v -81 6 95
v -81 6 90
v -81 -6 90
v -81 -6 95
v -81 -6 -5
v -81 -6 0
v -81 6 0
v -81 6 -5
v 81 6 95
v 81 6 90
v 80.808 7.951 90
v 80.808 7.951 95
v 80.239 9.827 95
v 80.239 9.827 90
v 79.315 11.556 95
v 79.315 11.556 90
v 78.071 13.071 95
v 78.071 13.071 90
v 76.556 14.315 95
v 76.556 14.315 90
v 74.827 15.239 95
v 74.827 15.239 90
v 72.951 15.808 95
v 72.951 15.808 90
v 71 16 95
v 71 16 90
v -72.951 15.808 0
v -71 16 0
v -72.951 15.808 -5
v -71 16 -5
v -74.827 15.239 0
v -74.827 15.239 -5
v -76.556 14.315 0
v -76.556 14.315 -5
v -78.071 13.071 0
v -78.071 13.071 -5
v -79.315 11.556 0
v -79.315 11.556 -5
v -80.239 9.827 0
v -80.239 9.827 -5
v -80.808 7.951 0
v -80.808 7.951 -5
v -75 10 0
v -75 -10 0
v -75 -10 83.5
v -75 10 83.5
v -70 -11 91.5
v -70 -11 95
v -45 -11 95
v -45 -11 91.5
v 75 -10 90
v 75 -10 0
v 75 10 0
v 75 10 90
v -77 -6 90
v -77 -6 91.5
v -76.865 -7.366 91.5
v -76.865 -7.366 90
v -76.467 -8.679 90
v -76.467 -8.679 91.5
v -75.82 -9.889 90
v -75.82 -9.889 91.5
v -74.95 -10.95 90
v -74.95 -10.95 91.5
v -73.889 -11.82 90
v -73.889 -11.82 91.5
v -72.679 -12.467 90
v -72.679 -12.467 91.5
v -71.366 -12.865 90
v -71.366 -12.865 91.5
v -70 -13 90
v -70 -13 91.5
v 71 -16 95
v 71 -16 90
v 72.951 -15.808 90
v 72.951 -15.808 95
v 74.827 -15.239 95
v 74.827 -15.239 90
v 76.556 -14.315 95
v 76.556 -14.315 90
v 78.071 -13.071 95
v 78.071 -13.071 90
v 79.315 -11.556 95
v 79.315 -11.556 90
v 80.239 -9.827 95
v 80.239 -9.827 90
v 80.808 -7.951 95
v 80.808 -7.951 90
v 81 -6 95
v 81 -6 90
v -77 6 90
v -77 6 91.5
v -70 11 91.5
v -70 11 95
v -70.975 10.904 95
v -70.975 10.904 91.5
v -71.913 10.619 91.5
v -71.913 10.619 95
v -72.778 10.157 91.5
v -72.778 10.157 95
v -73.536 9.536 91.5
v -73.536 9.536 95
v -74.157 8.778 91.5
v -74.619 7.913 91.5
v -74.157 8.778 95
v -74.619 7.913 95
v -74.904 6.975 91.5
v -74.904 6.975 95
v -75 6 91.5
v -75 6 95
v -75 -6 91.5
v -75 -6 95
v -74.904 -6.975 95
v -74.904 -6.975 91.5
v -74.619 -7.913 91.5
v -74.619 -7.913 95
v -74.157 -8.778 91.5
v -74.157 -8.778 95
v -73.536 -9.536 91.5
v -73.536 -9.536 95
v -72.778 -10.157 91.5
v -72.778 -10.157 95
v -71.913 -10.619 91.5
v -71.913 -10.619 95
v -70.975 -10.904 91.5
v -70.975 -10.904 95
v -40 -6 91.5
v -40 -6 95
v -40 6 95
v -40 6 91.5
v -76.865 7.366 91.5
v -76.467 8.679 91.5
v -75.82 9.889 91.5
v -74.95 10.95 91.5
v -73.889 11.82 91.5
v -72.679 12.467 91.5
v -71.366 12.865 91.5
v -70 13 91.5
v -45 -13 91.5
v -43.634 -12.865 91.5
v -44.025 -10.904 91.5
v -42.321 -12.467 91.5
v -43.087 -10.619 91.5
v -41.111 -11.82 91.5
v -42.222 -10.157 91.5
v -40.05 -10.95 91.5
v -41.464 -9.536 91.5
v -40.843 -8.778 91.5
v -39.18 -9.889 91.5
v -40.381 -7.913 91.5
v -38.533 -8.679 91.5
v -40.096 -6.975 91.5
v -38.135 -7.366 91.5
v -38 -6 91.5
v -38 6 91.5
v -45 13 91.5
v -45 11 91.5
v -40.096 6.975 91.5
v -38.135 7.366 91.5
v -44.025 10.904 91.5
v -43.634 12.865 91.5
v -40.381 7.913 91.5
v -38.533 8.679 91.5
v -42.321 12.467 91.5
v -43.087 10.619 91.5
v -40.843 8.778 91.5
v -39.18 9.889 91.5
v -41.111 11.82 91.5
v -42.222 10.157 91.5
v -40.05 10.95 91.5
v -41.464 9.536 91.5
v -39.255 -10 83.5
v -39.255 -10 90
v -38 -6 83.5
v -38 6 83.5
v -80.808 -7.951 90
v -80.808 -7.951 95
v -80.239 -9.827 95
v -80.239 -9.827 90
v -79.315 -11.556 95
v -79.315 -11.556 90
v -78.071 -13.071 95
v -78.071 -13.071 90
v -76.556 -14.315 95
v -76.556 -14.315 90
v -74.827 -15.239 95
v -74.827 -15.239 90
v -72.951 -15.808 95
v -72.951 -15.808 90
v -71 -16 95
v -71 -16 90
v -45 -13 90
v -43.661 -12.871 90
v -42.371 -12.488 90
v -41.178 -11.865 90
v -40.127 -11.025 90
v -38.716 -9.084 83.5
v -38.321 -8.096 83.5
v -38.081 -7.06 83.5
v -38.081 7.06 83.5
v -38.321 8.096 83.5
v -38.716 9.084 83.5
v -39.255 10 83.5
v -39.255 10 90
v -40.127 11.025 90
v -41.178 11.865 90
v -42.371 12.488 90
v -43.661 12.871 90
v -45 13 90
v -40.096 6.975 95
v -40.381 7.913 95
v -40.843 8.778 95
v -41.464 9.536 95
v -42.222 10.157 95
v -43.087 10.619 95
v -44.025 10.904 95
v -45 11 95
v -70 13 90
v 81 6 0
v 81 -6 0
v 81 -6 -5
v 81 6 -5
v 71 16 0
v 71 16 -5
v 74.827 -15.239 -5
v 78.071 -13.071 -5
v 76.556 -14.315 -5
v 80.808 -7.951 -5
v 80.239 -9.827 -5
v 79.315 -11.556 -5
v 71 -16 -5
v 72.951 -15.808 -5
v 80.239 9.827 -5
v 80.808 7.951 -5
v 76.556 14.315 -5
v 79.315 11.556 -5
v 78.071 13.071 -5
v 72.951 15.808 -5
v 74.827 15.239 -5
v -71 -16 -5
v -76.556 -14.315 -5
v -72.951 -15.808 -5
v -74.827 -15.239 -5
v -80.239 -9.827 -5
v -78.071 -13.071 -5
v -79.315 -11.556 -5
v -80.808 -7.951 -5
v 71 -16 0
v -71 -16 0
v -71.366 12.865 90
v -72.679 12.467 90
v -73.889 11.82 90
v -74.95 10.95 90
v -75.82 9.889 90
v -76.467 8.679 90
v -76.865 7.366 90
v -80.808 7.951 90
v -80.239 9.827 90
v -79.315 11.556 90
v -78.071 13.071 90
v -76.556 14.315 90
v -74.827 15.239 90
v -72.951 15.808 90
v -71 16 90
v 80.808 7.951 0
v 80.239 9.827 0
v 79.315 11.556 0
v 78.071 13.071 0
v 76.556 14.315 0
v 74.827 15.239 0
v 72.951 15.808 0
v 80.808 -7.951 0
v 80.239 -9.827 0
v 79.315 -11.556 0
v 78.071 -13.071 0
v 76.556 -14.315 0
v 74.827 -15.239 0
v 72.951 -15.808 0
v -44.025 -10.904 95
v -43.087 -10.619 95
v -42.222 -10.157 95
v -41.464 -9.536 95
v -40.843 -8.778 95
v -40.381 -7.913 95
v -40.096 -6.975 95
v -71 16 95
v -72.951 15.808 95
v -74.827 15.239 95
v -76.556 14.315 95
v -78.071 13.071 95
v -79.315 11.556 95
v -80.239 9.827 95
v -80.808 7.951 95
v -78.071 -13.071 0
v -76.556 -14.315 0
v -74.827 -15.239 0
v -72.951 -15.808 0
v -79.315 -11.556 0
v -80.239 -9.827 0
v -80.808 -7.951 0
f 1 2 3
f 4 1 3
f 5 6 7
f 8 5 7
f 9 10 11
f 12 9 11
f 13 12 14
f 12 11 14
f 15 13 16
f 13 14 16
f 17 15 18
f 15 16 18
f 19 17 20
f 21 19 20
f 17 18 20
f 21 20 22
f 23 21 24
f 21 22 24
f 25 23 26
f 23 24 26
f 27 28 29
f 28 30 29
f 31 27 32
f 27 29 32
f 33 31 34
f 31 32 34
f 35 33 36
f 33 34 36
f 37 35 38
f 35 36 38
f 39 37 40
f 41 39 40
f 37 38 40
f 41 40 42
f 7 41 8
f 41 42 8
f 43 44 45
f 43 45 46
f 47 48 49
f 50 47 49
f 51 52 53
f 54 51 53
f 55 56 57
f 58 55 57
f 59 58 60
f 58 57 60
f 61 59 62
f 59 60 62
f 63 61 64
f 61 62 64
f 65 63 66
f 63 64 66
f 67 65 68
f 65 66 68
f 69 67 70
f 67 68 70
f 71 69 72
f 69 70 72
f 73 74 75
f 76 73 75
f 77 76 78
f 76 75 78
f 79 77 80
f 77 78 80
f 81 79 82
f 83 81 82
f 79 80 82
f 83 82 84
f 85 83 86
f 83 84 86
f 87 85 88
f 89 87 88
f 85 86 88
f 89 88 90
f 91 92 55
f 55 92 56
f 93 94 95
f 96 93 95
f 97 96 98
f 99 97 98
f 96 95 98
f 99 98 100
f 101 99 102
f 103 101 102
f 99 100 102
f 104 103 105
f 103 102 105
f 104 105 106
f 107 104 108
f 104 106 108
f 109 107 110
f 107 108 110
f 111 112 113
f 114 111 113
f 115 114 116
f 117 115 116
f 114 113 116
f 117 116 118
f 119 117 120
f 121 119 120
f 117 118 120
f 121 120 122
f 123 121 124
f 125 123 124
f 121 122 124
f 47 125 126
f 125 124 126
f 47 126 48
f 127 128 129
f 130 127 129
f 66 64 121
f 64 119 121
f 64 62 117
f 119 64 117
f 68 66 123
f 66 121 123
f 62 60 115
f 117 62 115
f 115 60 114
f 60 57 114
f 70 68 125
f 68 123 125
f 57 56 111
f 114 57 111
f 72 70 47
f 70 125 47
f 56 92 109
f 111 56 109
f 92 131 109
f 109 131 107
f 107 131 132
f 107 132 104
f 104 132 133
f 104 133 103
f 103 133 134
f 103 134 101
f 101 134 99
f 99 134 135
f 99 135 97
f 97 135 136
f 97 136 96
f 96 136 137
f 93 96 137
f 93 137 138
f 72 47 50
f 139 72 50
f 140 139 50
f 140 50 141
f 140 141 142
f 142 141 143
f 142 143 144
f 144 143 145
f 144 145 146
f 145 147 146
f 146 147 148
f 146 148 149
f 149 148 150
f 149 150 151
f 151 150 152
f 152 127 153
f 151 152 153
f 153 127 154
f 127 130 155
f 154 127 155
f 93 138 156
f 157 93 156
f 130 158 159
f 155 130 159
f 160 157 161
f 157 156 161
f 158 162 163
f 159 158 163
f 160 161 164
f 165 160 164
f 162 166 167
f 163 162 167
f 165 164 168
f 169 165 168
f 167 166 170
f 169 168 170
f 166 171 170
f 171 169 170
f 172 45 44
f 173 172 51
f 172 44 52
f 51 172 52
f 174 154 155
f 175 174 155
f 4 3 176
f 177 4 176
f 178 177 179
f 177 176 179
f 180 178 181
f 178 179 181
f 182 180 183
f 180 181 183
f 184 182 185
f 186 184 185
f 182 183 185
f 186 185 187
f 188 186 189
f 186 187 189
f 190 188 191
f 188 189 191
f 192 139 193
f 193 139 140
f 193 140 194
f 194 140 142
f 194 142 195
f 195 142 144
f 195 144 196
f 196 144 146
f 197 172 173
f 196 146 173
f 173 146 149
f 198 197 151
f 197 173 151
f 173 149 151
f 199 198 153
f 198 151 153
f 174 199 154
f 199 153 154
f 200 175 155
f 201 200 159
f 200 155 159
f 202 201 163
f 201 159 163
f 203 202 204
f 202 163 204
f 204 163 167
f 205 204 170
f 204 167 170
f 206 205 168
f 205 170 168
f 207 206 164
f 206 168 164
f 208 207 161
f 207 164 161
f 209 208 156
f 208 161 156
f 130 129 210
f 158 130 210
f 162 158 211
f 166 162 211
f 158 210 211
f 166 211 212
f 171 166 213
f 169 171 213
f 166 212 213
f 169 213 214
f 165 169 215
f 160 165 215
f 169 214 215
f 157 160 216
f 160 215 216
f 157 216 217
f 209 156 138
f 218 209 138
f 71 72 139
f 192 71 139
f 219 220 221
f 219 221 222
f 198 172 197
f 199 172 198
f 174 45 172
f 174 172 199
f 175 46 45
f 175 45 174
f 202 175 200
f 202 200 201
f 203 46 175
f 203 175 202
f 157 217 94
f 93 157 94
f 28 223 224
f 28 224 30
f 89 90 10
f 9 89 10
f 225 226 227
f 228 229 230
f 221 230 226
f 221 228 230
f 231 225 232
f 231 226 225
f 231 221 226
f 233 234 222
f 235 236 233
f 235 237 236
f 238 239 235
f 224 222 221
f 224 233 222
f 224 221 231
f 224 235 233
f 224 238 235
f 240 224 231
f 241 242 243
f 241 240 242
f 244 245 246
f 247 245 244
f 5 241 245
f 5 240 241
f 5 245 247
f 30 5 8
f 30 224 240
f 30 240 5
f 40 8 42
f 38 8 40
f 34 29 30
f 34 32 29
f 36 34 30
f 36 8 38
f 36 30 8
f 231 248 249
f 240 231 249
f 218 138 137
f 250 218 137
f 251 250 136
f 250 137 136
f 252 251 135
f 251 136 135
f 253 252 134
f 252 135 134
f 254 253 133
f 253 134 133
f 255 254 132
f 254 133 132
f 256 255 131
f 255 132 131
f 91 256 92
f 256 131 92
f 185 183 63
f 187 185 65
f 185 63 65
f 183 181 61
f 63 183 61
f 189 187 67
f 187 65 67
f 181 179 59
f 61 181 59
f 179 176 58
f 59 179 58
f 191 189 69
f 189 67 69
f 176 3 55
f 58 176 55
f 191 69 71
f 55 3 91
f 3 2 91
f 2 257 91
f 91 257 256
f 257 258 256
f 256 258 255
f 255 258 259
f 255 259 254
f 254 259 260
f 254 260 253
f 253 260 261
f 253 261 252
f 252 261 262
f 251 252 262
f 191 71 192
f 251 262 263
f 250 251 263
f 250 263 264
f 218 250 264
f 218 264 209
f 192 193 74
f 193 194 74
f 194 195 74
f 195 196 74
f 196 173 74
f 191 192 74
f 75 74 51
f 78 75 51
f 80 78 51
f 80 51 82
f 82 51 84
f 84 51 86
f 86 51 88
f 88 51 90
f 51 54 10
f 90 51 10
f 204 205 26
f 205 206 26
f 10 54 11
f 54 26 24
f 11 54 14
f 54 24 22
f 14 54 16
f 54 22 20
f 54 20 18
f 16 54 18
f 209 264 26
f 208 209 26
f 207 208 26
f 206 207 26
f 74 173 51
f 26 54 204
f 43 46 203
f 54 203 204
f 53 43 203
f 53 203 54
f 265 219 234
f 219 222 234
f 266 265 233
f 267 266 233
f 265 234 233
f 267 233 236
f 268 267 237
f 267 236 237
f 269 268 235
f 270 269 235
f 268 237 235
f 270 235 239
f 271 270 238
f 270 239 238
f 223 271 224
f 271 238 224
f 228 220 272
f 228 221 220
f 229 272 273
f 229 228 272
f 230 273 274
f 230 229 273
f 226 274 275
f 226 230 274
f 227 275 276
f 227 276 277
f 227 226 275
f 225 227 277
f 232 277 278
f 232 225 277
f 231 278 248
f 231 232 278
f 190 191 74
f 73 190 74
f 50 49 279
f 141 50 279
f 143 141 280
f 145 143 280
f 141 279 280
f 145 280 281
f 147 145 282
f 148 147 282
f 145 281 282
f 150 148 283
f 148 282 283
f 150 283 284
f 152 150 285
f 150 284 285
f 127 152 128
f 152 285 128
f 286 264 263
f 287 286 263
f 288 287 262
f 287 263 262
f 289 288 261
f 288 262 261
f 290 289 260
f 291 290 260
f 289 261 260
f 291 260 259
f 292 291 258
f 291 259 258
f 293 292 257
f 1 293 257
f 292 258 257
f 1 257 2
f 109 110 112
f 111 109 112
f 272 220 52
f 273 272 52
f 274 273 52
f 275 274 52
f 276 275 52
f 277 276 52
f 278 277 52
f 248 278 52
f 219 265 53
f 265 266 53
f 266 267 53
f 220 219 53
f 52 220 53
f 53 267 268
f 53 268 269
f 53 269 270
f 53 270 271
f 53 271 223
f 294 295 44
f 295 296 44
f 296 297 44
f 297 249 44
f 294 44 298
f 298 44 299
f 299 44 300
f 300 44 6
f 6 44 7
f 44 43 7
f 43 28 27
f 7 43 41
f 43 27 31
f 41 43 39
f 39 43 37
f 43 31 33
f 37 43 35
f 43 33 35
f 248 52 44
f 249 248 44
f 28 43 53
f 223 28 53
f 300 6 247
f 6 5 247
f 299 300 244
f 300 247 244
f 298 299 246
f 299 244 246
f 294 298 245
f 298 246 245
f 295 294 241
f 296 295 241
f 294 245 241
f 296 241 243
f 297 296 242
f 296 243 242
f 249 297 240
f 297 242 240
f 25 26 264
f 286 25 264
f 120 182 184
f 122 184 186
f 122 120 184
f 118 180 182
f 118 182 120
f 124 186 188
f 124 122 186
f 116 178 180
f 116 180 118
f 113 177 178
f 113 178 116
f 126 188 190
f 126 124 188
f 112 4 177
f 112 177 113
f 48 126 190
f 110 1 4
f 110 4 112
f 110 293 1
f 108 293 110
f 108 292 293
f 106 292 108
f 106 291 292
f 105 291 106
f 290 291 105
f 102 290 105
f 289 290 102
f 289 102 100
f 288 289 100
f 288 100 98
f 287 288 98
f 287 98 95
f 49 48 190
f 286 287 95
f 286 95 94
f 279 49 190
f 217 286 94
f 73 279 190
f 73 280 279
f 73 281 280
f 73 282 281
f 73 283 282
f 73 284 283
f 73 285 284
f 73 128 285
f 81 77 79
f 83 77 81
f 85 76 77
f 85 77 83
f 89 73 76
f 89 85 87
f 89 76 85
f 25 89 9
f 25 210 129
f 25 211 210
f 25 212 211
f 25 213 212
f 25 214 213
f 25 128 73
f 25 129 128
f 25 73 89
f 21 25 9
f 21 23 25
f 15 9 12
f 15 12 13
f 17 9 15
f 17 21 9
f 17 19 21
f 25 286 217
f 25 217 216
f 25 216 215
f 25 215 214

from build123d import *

# Parameters (mm, degrees)
SKETCH1_W           = 150
SKETCH1_H           = 20
BOSS_EXTRUDE1_DEPTH = 90
SKETCH2_W           = 162
SKETCH2_H           = 32
BOSS_EXTRUDE2_DEPTH = 5
FILLET1_R           = 10
FILLET2_R           = 10
FILLET3_R           = 10
FILLET4_R           = 10
BOSS_EXTRUDE3_DEPTH = 5
CUT_EXTRUDE1_DEPTH  = 3.5
CUT_EXTRUDE2_DEPTH  = 8


with BuildPart() as part:
    # Sketch1 → Boss-Extrude1 (new body)
    with BuildSketch(Plane.XY):
        Rectangle(SKETCH1_W, SKETCH1_H)
    extrude(amount=BOSS_EXTRUDE1_DEPTH)

    # Sketch2 → Boss-Extrude2 (add)
    with BuildSketch(Plane(origin=(0, 0, 0), x_dir=(-1, 0, 0), z_dir=(0, 0, -1))):
        Rectangle(SKETCH2_W, SKETCH2_H)
    extrude(amount=BOSS_EXTRUDE2_DEPTH)

    # Fillet1
    fillet1_edges = [part.edges().sort_by_distance(p)[0] for p in [
        (81, 16, -2.5),
    ]]
    fillet(fillet1_edges, radius=FILLET1_R)

    # Fillet2
    fillet2_edges = [part.edges().sort_by_distance(p)[0] for p in [
        (81, -16, -2.5),
    ]]
    fillet(fillet2_edges, radius=FILLET2_R)

    # Fillet3
    fillet3_edges = [part.edges().sort_by_distance(p)[0] for p in [
        (-81, 16, -2.5),
    ]]
    fillet(fillet3_edges, radius=FILLET3_R)

    # Fillet4
    fillet4_edges = [part.edges().sort_by_distance(p)[0] for p in [
        (-81, -16, -2.5),
    ]]
    fillet(fillet4_edges, radius=FILLET4_R)

    # Sketch3 → Boss-Extrude3 (add)
    with BuildSketch(Plane.XY.offset(90)):
        with BuildLine():
            Line((-81, 6), (-81, -6))
            ThreePointArc((-81, -6), (-78.071067812, -13.071067812), (-71, -16))
            Line((-71, -16), (71, -16))
            ThreePointArc((71, -16), (78.071067812, -13.071067812), (81, -6))
            Line((81, -6), (81, 6))
            ThreePointArc((81, 6), (78.071067812, 13.071067812), (71, 16))
            Line((71, 16), (-71, 16))
            ThreePointArc((-71, 16), (-78.071067812, 13.071067812), (-81, 6))
        make_face()
    extrude(amount=BOSS_EXTRUDE3_DEPTH)

    # Sketch4 → Cut-Extrude1 (cut)
    with BuildSketch(Plane.XY.offset(95)):
        with BuildLine():
            Line((-70, -11), (-45, -11))
            ThreePointArc((-45, -11), (-41.464466094, -9.535533906), (-40, -6))
            Line((-40, -6), (-40, 6))
            ThreePointArc((-40, 6), (-41.464466094, 9.535533906), (-45, 11))
            Line((-45, 11), (-70, 11))
            ThreePointArc((-70, 11), (-73.535533906, 9.535533906), (-75, 6))
            Line((-75, 6), (-75, -6))
            ThreePointArc((-75, -6), (-73.535533906, -9.535533906), (-70, -11))
        make_face()
    extrude(amount=-CUT_EXTRUDE1_DEPTH, mode=Mode.SUBTRACT)

    # Sketch5 → Cut-Extrude2 (cut)
    with BuildSketch(Plane.XY.offset(91.5)):
        with BuildLine():
            Line((-77, 6), (-77, -6))
            ThreePointArc((-77, -6), (-74.949747468, -10.949747468), (-70, -13))
            Line((-70, -13), (-45, -13))
            ThreePointArc((-45, -13), (-40.050252532, -10.949747468), (-38, -6))
            Line((-38, -6), (-38, 6))
            ThreePointArc((-38, 6), (-40.050252532, 10.949747468), (-45, 13))
            Line((-45, 13), (-70, 13))
            ThreePointArc((-70, 13), (-74.949747468, 10.949747468), (-77, 6))
        make_face()
    extrude(amount=-CUT_EXTRUDE2_DEPTH, mode=Mode.SUBTRACT)


solid = part.part
